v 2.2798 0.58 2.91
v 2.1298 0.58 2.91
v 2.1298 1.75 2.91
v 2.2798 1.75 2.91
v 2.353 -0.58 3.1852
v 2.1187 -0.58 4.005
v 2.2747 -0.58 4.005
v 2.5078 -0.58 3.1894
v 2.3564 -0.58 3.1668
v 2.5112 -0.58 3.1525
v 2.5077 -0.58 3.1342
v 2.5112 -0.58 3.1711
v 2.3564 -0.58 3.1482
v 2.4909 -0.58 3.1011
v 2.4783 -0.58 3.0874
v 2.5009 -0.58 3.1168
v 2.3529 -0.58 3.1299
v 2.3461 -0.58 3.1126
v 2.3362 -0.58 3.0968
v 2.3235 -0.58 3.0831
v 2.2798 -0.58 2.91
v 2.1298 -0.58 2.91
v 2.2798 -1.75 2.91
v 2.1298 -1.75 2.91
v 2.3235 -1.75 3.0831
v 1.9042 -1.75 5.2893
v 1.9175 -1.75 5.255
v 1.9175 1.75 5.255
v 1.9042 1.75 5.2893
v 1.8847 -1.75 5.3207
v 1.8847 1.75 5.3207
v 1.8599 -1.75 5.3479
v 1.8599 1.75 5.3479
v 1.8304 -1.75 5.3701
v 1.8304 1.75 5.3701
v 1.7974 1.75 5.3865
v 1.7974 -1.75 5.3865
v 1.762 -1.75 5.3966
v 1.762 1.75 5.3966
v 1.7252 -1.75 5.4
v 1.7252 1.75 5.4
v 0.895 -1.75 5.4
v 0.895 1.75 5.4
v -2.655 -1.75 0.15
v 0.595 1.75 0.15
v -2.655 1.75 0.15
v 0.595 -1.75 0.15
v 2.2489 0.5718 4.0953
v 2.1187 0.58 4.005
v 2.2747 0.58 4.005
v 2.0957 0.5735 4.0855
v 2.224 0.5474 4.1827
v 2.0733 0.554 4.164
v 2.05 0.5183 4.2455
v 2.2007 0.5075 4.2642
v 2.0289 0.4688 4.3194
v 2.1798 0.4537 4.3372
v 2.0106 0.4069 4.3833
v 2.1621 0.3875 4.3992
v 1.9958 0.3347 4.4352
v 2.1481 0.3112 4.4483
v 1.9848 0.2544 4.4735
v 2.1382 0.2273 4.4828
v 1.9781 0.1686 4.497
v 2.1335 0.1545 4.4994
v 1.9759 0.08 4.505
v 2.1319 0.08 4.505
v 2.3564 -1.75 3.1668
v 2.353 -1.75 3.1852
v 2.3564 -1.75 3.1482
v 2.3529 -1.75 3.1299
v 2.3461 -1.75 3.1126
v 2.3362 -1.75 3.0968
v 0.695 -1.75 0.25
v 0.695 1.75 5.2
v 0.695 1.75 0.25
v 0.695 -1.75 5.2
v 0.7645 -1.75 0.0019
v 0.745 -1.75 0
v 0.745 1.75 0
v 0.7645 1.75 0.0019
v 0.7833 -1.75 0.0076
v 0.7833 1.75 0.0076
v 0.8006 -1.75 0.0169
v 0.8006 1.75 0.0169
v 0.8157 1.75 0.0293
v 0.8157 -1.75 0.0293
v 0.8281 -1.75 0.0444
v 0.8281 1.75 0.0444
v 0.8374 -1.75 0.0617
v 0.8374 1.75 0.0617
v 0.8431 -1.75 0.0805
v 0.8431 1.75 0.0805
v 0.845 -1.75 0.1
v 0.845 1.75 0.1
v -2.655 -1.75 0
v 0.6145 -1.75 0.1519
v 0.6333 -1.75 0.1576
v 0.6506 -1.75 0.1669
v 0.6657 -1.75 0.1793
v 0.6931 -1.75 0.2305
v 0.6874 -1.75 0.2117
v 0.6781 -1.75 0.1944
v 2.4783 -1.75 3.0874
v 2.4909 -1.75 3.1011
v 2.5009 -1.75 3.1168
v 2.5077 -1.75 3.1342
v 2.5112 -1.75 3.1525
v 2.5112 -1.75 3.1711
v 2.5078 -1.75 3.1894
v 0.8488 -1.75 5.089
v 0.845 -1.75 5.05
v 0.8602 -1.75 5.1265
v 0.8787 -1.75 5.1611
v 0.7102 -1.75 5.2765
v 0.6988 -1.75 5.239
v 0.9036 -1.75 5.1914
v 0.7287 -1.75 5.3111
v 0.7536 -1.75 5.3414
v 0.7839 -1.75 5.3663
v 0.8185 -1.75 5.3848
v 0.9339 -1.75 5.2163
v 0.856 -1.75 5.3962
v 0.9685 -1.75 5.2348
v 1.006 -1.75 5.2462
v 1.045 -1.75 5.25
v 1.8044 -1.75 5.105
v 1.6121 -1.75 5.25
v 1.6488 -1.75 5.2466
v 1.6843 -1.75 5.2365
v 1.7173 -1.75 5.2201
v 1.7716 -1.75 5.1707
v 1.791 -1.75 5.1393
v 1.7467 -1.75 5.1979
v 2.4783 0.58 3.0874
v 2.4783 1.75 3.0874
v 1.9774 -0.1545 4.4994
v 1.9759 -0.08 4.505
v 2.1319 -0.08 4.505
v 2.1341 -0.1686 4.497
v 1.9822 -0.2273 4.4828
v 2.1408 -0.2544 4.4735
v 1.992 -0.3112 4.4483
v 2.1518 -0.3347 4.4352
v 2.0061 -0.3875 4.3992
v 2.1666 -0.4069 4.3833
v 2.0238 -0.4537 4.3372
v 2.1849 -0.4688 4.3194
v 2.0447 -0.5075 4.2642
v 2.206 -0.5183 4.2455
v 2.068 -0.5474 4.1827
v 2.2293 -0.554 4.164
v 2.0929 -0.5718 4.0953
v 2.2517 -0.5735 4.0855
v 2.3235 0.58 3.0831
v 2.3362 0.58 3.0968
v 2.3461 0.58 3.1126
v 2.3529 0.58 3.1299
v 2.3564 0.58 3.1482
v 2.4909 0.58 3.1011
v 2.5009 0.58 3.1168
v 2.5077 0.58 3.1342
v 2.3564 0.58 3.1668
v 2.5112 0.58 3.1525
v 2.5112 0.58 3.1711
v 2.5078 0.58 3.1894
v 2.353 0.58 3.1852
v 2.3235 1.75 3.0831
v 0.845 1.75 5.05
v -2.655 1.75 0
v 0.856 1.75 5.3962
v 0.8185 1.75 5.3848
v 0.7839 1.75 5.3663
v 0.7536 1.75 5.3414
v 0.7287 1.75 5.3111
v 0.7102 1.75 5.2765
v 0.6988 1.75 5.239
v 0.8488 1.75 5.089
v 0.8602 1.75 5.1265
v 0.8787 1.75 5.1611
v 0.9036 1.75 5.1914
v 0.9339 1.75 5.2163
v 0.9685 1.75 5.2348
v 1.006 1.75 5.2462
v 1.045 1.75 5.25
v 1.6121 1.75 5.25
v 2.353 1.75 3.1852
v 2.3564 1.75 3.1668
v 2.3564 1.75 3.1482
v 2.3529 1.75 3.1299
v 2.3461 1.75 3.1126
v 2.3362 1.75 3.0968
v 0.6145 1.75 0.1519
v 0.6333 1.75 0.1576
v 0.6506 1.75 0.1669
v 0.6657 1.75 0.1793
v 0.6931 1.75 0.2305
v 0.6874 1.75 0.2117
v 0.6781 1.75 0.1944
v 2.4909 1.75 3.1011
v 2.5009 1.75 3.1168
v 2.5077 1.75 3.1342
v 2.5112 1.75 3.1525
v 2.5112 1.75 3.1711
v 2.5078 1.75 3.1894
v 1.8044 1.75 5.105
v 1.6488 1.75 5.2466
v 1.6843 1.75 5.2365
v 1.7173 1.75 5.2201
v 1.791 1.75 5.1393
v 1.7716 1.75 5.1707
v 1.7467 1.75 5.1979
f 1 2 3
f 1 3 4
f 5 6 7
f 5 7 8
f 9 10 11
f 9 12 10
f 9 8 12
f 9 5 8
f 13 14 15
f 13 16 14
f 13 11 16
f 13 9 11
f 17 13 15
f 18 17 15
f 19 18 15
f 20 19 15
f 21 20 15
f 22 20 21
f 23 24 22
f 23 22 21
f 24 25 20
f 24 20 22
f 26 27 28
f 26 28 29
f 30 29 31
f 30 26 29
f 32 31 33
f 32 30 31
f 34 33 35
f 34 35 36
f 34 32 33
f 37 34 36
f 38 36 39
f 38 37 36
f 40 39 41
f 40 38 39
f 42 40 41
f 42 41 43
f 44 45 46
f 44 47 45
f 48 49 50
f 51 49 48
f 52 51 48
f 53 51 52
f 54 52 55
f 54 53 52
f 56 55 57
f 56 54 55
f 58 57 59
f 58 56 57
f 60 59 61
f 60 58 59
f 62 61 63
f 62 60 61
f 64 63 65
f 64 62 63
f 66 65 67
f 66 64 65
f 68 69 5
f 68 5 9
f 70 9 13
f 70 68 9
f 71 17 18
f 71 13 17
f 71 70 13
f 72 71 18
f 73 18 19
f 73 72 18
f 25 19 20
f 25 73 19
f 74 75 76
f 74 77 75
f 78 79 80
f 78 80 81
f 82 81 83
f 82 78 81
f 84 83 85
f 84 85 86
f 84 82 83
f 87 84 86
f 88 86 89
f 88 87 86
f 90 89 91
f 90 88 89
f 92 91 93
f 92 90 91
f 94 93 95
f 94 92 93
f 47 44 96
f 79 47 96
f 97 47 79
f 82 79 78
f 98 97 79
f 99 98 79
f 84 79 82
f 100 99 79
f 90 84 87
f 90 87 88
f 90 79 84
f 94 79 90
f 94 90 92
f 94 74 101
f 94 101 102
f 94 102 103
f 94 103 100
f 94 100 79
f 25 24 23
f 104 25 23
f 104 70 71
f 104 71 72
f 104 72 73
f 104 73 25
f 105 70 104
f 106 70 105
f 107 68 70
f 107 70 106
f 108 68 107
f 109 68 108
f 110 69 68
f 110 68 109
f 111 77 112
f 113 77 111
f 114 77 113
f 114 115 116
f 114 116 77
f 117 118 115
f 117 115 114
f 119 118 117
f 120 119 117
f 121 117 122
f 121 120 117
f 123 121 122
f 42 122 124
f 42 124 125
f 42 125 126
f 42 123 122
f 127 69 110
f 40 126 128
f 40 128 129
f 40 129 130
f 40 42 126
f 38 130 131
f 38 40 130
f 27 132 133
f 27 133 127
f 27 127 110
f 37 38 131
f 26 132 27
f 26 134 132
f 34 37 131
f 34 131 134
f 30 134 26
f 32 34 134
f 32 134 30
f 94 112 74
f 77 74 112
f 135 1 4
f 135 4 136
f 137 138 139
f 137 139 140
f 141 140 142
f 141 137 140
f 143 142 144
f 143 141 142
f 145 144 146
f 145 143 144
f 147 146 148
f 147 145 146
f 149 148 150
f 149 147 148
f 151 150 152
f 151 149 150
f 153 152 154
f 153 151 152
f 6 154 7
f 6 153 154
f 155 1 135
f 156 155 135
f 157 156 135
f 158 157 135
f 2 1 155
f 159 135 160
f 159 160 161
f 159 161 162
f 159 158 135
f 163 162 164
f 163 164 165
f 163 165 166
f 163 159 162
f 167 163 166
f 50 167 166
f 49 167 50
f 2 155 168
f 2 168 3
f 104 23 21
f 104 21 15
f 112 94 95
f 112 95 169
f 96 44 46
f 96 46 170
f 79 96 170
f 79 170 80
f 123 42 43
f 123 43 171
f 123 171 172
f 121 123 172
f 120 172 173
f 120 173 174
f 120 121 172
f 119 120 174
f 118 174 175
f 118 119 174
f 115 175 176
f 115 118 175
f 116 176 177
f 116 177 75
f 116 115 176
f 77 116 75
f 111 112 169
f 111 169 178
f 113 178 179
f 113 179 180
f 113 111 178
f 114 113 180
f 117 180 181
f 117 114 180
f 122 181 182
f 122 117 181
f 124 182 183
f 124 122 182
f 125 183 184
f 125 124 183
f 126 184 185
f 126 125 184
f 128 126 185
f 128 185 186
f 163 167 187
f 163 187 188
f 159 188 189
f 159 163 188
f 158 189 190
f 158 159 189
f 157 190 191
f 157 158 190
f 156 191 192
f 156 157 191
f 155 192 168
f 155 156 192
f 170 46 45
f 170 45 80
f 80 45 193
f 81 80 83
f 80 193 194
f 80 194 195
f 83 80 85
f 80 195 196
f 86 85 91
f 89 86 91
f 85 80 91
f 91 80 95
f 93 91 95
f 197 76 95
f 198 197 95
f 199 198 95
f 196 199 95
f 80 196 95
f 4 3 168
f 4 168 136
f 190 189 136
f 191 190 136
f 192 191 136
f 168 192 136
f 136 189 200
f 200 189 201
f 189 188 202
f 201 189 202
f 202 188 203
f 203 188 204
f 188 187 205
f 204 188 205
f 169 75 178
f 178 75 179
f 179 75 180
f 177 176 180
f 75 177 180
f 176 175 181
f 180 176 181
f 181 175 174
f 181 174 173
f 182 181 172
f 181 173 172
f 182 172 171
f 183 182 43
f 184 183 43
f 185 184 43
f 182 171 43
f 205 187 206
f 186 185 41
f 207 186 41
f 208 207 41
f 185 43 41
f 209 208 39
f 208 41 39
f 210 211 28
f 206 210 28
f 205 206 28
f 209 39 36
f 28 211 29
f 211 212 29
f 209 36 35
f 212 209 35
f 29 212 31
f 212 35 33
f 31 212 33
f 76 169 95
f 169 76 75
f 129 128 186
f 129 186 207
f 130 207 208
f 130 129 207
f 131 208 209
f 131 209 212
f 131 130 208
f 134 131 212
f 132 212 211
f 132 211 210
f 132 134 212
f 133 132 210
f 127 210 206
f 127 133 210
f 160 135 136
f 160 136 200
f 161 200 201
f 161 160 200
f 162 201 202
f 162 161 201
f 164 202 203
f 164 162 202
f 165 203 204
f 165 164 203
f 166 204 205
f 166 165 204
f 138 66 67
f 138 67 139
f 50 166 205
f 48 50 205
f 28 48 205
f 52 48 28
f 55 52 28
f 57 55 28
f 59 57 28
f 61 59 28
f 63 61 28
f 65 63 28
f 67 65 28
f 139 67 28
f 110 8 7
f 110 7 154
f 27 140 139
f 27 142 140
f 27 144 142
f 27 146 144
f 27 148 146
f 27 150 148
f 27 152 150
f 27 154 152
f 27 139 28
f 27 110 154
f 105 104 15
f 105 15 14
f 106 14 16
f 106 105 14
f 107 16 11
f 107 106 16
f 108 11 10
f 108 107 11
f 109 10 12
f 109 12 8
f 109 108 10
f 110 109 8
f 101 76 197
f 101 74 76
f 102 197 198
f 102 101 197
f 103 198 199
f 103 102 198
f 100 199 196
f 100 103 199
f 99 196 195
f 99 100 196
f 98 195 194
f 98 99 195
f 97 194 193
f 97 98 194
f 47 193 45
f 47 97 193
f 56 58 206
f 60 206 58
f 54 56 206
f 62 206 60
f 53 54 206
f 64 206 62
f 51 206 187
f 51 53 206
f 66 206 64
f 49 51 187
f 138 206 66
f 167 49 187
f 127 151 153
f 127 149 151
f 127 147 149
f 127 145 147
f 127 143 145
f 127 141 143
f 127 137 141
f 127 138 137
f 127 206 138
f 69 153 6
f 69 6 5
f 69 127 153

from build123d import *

# Parameters (mm, degrees)
F1_DEPTH      = 1.75
F1_DEPTH_BACK = 1.75
F3_DEPTH      = 25


with BuildPart() as f1:
    # F0 (on Front) → F1 (new body, two sides)
    with BuildSketch(Plane.XZ) as f1_sk:
        with BuildLine():
            Line((0.595, 0.15), (-2.655, 0.15))
            Line((-2.655, 0.15), (-2.655, 0))
            Line((-2.655, 0), (0.745, 0))
            ThreePointArc((0.745, 0), (0.815711, 0.029289), (0.845, 0.1))
            Line((0.845, 0.1), (0.845, 5.05))
            ThreePointArc((0.845, 5.05), (0.903579, 5.191421), (1.045, 5.25))
            Line((1.045, 5.25), (1.612098, 5.25))
            ThreePointArc((1.612098, 5.25), (1.732534, 5.209672), (1.804401, 5.104952))
            Line((1.804401, 5.104952), (2.352996, 3.185167))
            ThreePointArc((2.352996, 3.185167), (2.352908, 3.129908), (2.323486, 3.083132))
            Line((2.323486, 3.083132), (2.129785, 2.91))
            Line((2.129785, 2.91), (2.279785, 2.91))
            Line((2.279785, 2.91), (2.478268, 3.087407))
            ThreePointArc((2.478268, 3.087407), (2.50769, 3.134182), (2.507779, 3.189441))
            Line((2.507779, 3.189441), (1.917541, 5.254952))
            ThreePointArc((1.917541, 5.254952), (1.845674, 5.359672), (1.725239, 5.4))
            Line((1.725239, 5.4), (0.895, 5.4))
            ThreePointArc((0.895, 5.4), (0.753579, 5.341421), (0.695, 5.2))
            Line((0.695, 5.2), (0.695, 2.91))
            Line((0.695, 2.91), (0.695, 0.25))
            ThreePointArc((0.695, 0.25), (0.665711, 0.179289), (0.595, 0.15))
        make_face()
    extrude(amount=F1_DEPTH)
    extrude(f1_sk.sketch, amount=-F1_DEPTH_BACK)

    # F2 (on face) → F3 (cut)
    with BuildSketch(Plane.YZ.offset(0.845)):
        with BuildLine():
            Line((-0.58, 4.004952), (-0.58, 2.610195))
            Line((-0.58, 2.610195), (0.58, 2.610195))
            Line((0.58, 2.610195), (0.58, 4.004952))
            ThreePointArc((0.58, 4.004952), (0.433553, 4.358506), (0.08, 4.504952))
            Line((0.08, 4.504952), (-0.08, 4.504952))
            ThreePointArc((-0.08, 4.504952), (-0.433553, 4.358506), (-0.58, 4.004952))
        make_face()
    extrude(amount=F3_DEPTH, mode=Mode.SUBTRACT)


solid = f1.part
